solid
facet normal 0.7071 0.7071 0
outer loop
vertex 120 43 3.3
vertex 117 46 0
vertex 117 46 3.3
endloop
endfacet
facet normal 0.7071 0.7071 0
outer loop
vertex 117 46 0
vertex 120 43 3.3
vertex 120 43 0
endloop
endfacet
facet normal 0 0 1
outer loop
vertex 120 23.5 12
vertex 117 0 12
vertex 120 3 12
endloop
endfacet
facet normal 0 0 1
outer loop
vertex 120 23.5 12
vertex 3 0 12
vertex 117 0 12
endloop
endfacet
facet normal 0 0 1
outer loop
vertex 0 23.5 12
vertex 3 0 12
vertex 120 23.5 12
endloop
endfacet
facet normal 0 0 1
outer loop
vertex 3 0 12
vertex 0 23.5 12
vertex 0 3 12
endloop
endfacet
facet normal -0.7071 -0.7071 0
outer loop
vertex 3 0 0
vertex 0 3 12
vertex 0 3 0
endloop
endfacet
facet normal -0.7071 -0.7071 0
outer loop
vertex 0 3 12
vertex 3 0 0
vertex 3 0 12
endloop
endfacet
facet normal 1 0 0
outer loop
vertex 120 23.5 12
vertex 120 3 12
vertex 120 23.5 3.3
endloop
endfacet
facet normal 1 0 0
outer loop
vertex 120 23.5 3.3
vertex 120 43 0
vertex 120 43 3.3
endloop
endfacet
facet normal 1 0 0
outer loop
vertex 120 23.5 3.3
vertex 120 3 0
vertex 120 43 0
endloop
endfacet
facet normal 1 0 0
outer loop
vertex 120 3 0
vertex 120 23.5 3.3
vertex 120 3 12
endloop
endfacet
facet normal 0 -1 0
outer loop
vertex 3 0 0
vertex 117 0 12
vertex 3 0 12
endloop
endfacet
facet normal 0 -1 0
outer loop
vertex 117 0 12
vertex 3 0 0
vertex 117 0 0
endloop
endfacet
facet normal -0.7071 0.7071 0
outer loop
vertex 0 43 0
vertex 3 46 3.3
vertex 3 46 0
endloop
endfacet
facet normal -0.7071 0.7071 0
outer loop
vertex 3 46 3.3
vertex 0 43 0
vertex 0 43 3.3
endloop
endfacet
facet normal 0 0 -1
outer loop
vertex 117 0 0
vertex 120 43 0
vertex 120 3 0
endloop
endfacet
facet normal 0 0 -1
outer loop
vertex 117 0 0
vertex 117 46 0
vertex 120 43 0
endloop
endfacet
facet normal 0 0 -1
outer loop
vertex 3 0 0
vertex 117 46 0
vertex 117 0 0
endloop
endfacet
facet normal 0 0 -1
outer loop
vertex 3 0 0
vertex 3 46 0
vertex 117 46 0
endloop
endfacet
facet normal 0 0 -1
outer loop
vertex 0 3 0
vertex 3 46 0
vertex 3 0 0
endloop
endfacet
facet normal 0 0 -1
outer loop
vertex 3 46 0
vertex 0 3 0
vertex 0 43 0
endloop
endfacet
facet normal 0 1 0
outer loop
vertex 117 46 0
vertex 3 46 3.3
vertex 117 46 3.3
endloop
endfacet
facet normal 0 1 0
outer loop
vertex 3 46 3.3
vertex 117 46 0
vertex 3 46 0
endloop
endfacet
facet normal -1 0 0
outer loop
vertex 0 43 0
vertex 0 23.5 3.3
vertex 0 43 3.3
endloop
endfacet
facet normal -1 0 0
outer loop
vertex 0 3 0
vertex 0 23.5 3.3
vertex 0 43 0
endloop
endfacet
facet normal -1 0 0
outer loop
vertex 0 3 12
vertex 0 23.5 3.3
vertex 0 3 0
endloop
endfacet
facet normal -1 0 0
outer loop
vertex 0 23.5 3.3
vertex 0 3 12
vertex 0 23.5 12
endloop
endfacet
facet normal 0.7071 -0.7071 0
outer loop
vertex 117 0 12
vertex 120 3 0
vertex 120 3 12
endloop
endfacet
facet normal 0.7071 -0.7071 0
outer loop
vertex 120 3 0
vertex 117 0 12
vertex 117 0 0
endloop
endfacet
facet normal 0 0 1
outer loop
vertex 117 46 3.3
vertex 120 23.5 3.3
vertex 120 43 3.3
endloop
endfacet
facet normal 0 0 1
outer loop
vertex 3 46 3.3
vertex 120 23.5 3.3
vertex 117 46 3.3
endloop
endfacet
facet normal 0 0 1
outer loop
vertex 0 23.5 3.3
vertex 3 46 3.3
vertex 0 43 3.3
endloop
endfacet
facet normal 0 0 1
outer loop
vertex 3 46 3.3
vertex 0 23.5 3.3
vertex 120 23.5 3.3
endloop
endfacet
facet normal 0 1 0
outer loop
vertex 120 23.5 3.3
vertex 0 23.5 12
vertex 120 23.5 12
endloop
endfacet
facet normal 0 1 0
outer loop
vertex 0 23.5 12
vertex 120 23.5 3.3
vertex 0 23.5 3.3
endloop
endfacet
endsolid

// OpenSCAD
$fn = 32;

// ----------------------------------------------------------------------
// Stepped bar: sidestep, 120 x 46 x 12/3.3 mm
// ----------------------------------------------------------------------

// --- parameters (mm) ---
bar_l = 120;              // bar length, X
bar_w = 46;               // bar width, Y
plate_t = 12;             // thickness of the thick zone, Z
thin_t = 3.3;             // thickness of the thin zone
corner_c = 3;             // corner chamfer of the bar
step_cut = 8.7;           // material removed from the thin zone
ledge_y = 23.5;           // start of the ledge from the front edge
depth_1 = 8.7;            // depth of cut 1 from the top face

profile = [[3, 0], [117, 0], [120, 3], [120, 43], [117, 46], [3, 46], [0, 43], [0, 3]];  // primary outline, 8 points, counter clockwise
void_1 = [[-1, 23.5], [121, 23.5], [121, 47], [-1, 47]];  // ledge cut along one edge, 4 points

// --- the one profile operation ---
difference() {
  linear_extrude(height = plate_t) polygon(points = profile);
  translate([0, 0, plate_t - depth_1])
    linear_extrude(height = depth_1 + 1) polygon(points = void_1);
}
